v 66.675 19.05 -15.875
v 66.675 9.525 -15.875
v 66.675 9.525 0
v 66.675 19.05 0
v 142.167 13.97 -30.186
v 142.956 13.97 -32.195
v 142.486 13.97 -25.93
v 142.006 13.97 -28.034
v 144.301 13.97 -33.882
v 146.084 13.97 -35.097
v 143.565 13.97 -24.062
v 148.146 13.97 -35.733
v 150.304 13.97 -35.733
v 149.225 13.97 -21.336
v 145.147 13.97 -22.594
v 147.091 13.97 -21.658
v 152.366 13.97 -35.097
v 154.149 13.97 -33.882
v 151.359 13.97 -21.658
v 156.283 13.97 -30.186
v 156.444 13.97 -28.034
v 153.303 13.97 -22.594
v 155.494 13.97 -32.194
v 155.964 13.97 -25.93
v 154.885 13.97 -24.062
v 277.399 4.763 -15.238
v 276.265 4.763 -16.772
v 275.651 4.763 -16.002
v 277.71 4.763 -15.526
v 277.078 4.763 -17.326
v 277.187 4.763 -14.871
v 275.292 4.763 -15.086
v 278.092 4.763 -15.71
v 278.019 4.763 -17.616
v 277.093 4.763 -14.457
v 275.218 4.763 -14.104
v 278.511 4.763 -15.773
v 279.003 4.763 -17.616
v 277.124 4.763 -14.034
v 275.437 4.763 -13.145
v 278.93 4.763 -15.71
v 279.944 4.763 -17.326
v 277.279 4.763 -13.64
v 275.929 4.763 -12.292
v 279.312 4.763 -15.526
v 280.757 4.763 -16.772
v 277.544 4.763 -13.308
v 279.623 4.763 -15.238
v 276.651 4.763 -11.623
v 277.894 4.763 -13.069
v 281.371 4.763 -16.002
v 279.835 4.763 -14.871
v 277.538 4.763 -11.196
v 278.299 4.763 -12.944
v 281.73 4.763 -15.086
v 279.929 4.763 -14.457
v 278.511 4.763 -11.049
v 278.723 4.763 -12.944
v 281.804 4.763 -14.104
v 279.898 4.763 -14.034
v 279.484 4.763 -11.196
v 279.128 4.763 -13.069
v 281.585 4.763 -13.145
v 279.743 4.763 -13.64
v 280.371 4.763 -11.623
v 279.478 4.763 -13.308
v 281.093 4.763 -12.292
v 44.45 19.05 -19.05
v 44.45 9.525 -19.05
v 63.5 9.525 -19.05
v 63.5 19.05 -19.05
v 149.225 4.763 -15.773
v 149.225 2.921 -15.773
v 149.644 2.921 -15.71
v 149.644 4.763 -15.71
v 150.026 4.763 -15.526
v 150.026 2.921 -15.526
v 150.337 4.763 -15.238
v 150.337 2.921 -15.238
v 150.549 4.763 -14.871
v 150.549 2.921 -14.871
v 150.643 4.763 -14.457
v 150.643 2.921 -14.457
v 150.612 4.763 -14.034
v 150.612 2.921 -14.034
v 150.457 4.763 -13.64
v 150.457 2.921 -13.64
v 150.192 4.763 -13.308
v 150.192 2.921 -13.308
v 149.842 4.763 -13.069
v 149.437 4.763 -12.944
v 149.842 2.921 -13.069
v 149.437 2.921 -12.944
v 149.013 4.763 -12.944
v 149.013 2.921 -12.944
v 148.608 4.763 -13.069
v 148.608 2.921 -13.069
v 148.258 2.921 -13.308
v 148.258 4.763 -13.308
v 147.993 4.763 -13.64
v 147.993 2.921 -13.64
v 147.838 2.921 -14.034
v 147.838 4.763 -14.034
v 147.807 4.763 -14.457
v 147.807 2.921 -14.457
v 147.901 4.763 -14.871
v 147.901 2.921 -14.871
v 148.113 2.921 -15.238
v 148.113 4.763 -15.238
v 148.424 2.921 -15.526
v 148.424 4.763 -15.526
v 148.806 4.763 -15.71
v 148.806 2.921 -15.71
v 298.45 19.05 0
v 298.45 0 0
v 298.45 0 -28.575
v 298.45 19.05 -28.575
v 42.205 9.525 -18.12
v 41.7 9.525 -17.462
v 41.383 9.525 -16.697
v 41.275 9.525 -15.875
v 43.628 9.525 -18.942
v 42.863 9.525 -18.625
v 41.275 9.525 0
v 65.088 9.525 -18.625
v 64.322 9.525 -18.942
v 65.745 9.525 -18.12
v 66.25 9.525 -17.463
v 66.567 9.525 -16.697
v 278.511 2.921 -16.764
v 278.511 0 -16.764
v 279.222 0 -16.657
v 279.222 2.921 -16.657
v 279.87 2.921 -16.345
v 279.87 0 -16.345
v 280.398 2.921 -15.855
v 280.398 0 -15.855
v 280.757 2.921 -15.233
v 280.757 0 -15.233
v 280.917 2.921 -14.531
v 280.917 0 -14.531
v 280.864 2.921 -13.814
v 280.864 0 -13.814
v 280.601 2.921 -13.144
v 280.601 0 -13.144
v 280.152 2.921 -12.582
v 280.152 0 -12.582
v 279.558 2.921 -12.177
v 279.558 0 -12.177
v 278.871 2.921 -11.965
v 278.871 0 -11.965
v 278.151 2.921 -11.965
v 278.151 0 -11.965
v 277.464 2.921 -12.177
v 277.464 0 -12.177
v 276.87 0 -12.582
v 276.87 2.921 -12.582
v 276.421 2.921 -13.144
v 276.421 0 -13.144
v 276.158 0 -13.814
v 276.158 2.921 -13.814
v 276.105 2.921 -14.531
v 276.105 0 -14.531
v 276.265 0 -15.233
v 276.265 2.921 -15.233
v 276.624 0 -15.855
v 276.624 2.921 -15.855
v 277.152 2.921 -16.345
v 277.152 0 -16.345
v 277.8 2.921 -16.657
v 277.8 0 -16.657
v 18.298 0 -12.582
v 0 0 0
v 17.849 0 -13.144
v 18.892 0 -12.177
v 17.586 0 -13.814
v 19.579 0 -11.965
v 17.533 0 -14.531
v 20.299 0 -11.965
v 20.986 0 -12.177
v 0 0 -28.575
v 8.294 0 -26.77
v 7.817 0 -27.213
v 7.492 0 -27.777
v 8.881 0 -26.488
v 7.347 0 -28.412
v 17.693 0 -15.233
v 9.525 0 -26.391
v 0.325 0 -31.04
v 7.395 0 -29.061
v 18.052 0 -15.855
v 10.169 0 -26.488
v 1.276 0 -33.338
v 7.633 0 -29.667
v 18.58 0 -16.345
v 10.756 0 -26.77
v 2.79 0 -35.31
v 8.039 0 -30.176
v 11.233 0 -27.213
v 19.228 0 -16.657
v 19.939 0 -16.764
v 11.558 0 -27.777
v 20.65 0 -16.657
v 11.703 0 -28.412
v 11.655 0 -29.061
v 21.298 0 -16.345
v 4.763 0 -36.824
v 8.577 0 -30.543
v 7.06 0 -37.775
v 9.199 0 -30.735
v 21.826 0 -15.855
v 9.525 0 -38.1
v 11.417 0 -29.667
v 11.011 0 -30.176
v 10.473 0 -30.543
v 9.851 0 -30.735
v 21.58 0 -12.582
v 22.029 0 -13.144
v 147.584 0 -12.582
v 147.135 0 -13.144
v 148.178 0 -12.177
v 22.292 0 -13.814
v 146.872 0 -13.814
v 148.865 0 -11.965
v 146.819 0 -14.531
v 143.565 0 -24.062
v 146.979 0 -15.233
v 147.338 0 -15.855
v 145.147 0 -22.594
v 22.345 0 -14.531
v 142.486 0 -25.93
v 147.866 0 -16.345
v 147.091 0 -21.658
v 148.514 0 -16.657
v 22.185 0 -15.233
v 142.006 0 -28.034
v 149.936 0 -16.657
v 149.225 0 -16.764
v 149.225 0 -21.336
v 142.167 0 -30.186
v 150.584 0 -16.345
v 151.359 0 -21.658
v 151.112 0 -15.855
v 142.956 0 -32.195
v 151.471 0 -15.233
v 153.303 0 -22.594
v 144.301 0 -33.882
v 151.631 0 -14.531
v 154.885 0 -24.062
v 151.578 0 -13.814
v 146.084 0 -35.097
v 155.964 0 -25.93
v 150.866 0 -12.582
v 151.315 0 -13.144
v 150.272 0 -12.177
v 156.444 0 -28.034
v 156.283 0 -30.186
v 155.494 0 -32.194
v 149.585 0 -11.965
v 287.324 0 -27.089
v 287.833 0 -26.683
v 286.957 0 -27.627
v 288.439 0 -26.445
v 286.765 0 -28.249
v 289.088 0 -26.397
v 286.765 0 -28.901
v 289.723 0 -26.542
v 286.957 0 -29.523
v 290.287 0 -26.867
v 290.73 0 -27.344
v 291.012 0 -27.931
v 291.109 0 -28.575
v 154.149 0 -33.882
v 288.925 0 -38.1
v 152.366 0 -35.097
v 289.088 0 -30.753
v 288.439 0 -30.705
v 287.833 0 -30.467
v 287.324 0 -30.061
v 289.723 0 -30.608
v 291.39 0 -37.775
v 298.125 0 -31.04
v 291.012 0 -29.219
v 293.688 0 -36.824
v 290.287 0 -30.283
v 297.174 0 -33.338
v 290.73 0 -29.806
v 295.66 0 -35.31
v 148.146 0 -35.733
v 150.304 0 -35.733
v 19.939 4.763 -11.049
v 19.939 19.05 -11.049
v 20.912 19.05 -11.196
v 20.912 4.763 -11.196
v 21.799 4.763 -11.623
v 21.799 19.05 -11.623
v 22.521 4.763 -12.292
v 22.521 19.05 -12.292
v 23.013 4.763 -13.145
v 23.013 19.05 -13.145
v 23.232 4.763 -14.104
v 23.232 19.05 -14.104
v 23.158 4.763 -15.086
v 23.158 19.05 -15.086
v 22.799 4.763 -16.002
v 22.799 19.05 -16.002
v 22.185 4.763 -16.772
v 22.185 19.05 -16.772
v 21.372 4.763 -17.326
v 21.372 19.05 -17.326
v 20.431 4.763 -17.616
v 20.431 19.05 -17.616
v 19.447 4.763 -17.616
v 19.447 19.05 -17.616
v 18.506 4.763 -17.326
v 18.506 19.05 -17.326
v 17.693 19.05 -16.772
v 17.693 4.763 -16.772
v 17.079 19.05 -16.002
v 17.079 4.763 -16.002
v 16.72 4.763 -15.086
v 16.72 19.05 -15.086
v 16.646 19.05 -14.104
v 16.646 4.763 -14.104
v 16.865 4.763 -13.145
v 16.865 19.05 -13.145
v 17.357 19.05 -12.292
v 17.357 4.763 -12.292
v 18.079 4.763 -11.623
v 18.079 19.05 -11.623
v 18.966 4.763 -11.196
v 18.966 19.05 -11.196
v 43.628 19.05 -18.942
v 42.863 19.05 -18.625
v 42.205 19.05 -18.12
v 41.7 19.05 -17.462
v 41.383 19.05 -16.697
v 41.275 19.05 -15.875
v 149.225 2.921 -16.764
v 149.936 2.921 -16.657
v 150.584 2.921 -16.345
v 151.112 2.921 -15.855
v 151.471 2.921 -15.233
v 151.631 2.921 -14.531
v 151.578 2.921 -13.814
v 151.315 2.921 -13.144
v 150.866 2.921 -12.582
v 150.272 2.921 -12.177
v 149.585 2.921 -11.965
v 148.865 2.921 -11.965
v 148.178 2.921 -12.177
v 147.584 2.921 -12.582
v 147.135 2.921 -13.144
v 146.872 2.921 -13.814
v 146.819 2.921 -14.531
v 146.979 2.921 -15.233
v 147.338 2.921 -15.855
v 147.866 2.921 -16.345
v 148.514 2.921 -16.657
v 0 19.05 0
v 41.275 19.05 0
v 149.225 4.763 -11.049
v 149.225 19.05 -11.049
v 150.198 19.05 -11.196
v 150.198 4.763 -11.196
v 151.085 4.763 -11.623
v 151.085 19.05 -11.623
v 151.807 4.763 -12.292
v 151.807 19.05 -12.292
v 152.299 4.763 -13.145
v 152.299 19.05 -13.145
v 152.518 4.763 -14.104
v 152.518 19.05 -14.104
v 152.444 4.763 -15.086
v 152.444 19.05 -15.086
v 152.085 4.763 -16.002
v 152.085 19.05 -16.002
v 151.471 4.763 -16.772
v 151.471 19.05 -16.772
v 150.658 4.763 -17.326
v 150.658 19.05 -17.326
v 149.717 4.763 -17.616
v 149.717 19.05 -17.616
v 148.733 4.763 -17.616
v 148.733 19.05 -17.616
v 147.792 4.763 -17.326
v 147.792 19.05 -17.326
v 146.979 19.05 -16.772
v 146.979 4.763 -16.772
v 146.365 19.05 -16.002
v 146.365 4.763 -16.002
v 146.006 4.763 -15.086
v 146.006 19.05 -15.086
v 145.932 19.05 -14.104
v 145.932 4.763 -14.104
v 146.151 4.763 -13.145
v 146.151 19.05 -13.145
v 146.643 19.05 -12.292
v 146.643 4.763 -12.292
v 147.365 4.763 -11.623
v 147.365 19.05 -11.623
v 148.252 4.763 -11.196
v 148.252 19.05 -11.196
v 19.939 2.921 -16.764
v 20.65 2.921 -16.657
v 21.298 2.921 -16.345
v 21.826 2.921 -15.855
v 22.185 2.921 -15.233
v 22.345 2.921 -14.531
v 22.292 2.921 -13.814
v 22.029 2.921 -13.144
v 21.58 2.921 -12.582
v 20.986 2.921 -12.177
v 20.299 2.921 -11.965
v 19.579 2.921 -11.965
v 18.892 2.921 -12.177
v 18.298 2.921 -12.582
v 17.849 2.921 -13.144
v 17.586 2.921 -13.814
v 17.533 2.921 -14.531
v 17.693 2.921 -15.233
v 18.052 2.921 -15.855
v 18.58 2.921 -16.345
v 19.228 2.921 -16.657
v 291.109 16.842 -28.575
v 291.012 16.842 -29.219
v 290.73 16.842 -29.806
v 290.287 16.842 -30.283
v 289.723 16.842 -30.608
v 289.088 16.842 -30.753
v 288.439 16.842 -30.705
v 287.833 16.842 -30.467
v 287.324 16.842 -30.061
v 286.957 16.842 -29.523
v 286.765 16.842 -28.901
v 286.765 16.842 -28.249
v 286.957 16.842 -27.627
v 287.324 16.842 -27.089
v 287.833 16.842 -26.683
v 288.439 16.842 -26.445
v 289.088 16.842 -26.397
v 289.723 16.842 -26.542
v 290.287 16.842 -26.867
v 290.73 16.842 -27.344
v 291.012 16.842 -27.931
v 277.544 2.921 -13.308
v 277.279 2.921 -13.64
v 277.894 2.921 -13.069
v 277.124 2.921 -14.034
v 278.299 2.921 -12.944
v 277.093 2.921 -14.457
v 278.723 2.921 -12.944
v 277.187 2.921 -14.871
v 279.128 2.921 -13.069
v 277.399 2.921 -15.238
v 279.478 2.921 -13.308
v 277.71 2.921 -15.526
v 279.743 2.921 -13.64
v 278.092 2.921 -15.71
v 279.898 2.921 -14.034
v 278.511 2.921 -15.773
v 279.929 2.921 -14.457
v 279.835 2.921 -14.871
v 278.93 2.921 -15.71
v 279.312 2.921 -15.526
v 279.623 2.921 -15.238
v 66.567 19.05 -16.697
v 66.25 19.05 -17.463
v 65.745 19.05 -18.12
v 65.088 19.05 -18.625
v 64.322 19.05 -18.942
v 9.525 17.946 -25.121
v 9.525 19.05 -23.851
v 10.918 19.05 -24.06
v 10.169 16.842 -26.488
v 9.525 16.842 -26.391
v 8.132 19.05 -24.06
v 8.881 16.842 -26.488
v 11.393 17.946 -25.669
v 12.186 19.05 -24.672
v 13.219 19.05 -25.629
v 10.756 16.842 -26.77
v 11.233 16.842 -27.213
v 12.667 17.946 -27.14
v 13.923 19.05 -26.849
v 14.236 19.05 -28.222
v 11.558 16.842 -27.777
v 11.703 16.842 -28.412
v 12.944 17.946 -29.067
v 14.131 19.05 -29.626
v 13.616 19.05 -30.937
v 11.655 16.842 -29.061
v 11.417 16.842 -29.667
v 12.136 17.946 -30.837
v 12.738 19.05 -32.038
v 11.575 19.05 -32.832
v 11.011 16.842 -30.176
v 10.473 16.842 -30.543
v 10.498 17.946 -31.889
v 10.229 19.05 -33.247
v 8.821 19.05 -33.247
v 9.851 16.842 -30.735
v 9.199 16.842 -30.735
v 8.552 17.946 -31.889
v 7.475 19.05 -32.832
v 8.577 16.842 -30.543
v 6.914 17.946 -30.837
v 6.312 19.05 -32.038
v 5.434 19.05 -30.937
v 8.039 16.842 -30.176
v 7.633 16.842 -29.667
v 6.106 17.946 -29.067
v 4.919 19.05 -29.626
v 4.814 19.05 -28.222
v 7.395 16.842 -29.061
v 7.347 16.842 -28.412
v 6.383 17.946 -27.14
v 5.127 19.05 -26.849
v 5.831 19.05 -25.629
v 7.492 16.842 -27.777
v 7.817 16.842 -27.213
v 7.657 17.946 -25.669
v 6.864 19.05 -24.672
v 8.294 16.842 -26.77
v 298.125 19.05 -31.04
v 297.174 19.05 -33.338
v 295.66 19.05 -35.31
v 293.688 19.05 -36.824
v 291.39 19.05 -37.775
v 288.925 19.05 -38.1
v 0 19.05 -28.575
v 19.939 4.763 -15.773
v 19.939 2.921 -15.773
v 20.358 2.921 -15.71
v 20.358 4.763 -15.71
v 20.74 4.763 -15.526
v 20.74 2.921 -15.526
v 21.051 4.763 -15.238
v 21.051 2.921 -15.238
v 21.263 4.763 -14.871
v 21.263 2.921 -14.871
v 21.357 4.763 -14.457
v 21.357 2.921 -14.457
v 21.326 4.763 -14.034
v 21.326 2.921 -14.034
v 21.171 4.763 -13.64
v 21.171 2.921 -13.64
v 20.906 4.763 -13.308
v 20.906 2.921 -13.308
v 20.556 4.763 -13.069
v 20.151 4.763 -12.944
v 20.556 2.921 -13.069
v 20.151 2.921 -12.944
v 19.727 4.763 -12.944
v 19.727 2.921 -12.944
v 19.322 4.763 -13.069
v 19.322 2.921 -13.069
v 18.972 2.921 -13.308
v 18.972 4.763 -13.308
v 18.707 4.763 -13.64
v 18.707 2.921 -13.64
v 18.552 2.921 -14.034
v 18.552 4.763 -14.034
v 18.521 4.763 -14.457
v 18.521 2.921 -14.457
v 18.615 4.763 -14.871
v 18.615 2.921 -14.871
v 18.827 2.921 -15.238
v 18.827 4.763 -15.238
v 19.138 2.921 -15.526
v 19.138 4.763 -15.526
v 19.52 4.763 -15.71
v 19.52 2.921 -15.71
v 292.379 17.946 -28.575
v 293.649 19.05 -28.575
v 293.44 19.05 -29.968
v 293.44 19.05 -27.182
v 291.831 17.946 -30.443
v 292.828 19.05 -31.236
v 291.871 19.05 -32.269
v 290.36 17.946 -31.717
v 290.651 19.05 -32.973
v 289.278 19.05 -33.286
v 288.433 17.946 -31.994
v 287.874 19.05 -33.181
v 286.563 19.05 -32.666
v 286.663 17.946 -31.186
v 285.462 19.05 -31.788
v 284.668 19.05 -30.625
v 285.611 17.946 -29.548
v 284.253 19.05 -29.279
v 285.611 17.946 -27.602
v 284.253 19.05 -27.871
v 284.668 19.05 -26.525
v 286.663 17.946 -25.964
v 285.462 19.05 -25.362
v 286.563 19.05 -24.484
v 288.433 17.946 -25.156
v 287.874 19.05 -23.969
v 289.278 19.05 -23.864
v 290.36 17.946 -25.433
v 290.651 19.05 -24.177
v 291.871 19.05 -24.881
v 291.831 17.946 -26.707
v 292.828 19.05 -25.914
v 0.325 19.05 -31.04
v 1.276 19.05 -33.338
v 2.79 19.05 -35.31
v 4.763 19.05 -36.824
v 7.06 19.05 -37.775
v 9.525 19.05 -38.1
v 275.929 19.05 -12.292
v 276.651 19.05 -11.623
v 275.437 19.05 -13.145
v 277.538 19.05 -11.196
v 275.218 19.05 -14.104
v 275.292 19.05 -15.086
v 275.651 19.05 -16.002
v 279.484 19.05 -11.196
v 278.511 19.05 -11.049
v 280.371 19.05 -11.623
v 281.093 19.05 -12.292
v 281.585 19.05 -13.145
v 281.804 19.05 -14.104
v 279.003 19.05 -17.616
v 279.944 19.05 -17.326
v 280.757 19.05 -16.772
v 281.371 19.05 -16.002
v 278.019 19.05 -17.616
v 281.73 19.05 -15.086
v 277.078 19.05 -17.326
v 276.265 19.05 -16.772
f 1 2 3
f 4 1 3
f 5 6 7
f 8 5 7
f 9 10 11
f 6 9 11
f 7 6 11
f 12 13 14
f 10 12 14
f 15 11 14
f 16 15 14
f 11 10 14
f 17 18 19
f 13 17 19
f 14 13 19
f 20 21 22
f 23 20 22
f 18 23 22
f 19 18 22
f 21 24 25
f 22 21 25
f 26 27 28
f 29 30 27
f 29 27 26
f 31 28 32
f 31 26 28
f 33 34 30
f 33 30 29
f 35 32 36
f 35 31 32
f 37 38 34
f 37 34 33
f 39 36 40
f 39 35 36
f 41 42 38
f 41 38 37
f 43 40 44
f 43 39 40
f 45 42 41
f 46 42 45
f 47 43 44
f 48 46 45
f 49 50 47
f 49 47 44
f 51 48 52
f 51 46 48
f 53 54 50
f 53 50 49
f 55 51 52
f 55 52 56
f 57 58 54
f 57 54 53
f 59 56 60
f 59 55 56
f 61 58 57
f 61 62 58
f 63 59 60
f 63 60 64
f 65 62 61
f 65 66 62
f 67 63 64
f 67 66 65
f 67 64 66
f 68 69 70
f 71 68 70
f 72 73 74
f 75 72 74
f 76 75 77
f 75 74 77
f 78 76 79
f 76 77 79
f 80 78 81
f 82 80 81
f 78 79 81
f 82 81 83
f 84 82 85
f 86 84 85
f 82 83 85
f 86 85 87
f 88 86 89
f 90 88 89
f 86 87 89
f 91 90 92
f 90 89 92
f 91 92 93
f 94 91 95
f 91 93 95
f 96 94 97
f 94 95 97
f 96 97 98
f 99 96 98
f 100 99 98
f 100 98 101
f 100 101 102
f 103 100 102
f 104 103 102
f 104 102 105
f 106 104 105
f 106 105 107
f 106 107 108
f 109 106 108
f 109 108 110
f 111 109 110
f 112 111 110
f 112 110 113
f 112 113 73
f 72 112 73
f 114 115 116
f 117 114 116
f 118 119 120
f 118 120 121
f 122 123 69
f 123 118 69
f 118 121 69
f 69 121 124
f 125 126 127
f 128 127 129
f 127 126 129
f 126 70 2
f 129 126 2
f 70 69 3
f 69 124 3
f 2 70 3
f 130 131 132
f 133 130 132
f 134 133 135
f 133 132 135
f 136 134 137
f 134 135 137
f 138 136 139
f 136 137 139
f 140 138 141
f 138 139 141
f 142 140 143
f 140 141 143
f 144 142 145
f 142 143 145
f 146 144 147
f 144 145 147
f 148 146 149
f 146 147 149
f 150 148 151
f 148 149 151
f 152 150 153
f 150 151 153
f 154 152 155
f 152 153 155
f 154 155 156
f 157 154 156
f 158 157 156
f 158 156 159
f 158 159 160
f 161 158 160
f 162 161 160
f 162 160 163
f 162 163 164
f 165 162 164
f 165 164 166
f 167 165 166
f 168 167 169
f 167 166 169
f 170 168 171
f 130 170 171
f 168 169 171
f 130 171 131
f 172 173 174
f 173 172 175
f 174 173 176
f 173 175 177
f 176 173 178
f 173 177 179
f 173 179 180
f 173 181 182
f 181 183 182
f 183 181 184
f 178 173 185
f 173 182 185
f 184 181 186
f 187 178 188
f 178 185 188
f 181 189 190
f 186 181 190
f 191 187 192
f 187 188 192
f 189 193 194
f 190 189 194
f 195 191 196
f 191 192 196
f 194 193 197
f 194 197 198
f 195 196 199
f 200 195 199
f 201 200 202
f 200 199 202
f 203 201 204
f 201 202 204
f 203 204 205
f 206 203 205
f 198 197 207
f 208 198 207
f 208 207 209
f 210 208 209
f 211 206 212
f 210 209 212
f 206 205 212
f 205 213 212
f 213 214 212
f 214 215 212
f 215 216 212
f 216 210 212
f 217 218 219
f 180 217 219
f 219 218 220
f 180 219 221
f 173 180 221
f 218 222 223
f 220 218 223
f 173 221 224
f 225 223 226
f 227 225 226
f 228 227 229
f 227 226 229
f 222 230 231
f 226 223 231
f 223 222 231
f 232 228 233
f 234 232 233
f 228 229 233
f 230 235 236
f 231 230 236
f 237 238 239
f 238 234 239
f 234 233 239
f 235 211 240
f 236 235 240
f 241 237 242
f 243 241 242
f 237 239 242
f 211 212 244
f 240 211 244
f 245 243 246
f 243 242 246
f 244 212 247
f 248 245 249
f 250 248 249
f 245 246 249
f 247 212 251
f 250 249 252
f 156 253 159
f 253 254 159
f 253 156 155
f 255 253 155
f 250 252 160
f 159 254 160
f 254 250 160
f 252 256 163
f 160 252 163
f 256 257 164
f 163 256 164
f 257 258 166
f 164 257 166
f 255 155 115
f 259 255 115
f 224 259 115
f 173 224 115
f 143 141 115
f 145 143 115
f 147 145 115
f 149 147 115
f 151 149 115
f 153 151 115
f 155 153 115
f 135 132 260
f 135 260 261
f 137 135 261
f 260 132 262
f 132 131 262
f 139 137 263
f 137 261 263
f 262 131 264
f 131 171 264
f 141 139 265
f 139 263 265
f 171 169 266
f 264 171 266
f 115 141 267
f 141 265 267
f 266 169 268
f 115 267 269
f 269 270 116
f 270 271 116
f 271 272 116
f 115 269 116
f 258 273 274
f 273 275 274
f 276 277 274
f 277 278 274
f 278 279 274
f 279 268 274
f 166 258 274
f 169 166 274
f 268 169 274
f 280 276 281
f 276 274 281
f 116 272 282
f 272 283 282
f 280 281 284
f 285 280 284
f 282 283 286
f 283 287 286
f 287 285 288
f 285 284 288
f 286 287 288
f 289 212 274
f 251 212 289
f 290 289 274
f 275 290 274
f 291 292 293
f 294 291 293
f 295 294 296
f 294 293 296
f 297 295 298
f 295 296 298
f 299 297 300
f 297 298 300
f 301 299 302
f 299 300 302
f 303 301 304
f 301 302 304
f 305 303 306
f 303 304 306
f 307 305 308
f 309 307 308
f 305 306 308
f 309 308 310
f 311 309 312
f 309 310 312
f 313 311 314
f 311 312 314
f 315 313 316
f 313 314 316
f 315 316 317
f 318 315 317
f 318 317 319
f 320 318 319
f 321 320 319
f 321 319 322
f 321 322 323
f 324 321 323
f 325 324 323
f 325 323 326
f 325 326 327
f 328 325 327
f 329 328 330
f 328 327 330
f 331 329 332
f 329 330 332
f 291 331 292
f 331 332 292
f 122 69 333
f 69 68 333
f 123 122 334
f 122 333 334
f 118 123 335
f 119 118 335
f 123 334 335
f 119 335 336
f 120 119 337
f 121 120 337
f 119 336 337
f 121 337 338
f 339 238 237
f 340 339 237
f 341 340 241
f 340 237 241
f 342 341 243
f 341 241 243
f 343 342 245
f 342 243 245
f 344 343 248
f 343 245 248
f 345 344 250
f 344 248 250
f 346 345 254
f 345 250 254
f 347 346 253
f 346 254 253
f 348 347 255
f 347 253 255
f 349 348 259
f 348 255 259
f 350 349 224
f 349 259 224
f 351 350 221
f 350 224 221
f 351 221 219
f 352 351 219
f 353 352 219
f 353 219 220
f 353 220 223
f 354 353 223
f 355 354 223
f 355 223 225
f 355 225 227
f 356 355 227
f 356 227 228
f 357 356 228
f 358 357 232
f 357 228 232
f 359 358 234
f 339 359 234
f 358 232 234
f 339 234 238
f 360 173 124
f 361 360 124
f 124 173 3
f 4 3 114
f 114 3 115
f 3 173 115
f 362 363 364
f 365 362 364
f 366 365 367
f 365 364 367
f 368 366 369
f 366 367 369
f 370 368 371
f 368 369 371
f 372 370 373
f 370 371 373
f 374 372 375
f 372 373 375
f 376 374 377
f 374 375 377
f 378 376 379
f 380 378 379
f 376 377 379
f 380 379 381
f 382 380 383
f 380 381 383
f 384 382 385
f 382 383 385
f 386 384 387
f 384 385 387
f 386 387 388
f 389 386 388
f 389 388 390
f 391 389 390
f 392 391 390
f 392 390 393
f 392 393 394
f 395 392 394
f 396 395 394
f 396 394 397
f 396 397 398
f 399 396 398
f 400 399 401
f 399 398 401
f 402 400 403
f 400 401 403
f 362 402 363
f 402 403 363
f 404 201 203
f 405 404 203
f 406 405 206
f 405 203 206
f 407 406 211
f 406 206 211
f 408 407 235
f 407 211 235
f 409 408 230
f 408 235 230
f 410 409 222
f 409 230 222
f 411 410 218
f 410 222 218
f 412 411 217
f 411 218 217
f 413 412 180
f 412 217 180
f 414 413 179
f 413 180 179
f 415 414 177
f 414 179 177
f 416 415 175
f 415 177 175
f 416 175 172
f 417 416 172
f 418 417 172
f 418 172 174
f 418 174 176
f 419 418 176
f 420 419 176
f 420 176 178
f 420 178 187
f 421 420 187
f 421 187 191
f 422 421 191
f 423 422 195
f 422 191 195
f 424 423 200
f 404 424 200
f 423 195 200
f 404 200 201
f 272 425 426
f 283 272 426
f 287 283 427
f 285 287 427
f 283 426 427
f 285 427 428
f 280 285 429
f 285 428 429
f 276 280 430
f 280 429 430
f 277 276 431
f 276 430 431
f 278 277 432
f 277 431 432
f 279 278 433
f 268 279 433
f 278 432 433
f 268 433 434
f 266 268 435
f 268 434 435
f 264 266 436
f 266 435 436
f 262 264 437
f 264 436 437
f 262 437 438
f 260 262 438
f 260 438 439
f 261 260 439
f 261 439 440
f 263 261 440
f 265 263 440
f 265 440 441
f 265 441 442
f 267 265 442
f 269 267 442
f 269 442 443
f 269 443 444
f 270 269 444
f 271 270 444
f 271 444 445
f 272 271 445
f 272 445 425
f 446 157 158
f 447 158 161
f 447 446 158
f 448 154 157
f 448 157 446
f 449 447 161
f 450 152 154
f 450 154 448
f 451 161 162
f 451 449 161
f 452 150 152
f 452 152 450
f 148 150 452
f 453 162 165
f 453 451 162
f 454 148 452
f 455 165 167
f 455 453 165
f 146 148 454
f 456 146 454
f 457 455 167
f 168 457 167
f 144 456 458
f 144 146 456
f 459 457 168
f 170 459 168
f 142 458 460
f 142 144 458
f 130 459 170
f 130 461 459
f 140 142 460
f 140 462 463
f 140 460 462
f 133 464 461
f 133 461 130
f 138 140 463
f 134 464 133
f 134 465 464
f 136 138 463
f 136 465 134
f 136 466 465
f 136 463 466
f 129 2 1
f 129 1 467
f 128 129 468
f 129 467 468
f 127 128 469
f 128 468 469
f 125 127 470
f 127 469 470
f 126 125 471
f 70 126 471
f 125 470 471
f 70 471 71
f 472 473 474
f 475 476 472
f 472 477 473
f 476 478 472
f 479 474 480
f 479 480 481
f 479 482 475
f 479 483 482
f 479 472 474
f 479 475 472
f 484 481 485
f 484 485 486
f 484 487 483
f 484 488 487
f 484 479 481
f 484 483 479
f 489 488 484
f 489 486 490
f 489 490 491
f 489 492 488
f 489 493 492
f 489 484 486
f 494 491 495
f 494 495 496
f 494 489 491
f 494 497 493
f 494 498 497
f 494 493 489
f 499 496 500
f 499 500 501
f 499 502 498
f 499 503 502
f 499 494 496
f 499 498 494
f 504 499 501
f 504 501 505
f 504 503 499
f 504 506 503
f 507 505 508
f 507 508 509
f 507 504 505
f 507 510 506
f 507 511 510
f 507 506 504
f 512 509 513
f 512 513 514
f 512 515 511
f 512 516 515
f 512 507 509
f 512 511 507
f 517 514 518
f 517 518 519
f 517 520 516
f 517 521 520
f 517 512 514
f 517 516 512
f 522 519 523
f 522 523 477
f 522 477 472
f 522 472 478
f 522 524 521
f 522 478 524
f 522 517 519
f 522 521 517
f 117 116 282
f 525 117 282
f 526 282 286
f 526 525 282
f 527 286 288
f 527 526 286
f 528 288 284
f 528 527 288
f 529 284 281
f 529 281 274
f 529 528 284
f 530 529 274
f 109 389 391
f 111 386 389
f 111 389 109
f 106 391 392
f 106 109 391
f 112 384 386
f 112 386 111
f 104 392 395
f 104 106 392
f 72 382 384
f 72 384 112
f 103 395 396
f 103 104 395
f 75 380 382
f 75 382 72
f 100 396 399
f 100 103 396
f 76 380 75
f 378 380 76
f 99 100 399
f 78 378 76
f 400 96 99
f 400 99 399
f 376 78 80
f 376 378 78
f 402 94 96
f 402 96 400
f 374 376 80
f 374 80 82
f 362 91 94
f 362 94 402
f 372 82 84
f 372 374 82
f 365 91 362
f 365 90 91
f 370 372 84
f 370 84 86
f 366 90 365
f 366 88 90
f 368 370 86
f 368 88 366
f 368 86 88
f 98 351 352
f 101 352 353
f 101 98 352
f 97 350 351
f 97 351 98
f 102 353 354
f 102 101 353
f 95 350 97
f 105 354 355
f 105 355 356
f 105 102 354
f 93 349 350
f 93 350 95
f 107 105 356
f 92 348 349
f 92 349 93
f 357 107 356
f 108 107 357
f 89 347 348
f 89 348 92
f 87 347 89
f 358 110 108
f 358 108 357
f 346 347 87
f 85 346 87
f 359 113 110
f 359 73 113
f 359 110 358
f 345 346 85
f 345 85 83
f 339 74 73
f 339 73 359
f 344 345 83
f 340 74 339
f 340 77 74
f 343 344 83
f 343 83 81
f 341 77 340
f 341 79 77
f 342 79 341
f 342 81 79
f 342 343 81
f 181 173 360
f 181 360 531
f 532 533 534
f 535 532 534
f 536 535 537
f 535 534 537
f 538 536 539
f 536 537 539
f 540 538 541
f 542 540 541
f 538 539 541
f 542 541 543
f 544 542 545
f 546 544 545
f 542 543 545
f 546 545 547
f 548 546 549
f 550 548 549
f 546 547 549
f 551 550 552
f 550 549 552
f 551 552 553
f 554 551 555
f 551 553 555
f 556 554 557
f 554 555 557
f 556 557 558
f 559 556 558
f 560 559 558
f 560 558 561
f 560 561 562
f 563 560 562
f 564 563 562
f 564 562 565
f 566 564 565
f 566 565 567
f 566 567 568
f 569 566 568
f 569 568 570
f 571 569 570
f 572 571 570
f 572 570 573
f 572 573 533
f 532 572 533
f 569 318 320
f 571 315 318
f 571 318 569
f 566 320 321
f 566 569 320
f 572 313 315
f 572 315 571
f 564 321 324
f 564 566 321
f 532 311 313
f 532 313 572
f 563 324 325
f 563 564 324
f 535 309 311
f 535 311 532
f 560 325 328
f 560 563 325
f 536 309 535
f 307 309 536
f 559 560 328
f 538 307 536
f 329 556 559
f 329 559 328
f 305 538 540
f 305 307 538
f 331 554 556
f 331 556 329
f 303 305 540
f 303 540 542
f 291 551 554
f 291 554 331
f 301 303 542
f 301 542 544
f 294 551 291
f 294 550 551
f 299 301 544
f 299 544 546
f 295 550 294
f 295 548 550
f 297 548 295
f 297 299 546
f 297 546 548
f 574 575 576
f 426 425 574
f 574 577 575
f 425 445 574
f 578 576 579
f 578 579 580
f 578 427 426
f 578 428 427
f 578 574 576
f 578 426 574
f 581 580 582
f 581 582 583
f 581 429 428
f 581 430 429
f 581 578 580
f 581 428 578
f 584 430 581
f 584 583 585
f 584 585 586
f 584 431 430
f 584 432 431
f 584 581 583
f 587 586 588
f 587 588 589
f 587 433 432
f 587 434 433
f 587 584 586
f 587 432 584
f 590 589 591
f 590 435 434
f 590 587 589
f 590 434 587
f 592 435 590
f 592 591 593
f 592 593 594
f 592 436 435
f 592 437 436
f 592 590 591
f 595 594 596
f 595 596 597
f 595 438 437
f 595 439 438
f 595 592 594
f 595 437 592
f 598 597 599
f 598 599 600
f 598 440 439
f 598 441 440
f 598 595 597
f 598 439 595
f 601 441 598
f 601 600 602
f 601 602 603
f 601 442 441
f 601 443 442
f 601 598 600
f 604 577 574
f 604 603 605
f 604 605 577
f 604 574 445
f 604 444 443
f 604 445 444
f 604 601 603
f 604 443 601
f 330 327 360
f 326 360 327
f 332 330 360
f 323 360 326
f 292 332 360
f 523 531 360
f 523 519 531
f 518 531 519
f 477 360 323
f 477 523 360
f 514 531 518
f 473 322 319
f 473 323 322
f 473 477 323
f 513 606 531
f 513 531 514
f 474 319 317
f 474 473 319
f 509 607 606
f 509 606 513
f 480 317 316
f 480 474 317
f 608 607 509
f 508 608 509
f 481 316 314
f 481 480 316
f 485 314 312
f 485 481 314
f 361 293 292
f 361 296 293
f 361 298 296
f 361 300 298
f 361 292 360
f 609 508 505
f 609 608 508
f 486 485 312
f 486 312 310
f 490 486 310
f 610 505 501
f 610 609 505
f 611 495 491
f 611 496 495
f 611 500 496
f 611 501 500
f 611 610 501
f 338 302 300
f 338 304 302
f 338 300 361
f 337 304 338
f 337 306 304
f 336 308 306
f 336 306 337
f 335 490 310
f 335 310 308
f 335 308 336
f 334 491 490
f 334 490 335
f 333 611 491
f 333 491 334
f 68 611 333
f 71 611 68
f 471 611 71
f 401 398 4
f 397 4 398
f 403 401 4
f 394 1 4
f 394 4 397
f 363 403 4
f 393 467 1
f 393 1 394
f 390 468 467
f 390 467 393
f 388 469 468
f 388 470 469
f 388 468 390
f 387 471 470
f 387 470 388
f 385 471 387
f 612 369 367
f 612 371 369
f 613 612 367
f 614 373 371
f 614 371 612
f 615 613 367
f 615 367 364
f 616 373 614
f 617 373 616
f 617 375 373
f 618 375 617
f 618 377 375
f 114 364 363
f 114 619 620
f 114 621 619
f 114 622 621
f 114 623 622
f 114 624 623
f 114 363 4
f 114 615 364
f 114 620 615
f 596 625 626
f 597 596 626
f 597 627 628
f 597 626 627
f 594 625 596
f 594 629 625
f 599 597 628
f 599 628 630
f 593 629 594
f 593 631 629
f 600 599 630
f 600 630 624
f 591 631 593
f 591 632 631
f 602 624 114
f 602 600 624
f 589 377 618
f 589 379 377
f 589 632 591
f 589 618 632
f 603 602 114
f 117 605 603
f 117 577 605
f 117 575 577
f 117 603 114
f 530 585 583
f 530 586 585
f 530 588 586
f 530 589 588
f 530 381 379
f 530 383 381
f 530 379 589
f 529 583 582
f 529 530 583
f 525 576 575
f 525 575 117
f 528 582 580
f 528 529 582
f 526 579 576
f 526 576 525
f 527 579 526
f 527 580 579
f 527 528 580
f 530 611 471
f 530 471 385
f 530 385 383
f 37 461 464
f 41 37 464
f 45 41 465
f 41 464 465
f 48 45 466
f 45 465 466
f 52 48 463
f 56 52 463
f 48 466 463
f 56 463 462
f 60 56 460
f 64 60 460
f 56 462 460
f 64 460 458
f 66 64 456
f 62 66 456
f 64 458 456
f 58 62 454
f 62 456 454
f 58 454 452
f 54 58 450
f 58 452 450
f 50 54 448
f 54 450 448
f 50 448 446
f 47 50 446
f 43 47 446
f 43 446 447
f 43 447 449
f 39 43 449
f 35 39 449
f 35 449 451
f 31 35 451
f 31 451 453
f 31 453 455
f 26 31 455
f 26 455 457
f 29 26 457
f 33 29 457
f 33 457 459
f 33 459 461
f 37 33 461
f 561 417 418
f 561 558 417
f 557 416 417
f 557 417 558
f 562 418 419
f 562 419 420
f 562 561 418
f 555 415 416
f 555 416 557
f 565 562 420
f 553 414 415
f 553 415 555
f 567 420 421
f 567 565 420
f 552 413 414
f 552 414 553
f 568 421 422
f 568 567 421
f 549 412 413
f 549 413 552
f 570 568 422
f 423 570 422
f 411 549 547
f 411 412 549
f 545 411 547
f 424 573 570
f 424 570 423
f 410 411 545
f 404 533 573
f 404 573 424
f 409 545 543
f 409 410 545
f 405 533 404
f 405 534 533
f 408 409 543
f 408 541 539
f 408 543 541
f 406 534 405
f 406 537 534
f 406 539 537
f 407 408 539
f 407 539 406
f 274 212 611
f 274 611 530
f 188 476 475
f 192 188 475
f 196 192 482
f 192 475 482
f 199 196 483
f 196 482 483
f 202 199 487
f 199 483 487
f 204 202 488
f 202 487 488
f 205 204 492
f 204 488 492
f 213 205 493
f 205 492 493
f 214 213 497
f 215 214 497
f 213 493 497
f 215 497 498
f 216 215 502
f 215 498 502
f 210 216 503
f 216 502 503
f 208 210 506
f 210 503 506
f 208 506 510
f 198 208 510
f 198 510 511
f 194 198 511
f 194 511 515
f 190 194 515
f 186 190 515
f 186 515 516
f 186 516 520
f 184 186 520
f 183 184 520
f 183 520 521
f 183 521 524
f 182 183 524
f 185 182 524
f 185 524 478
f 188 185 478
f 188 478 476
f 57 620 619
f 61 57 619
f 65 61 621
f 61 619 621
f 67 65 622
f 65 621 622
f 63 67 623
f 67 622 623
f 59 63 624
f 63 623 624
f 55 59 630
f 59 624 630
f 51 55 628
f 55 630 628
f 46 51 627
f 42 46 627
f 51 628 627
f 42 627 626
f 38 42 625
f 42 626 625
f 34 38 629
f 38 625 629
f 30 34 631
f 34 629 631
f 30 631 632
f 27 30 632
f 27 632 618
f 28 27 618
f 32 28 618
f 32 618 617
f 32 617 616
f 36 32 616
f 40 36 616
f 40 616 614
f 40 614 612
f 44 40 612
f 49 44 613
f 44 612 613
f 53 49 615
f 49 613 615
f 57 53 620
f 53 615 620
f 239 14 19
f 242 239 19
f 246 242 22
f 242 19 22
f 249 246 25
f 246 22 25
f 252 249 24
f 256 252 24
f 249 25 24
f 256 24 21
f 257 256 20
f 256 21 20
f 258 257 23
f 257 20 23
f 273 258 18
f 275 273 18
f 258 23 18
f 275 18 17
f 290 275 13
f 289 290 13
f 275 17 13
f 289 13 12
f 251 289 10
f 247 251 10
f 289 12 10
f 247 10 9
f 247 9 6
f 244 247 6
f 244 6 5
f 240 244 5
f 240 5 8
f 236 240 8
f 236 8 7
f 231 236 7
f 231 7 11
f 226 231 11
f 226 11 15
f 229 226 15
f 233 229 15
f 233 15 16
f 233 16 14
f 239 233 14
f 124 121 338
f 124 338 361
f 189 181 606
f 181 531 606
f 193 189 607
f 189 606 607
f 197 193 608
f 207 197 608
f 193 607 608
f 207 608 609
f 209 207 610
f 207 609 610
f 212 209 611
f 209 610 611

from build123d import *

# Parameters (mm, degrees)
SKETCH1_W           = 298.45
SKETCH1_H           = 38.1
BOSS_EXTRUDE1_DEPTH = 19.05
FILLET1_R           = 9.525
SKETCH2_R           = 3.302
CUT_EXTRUDE1_DEPTH  = 14.2875
SKETCH4_R           = 1.4224
CUT_EXTRUDE2_DEPTH  = 302.47456775
SKETCH5_R           = 2.413
CUT_EXTRUDE3_DEPTH  = 2.921
SKETCH6_R           = 2.1844
CUT_EXTRUDE4_DEPTH  = 302.47456775
CHAMFER1_SIZE       = 2.54
CHAMFER1_SIZE2      = 2.207988314
CUT_EXTRUDE5_START  = -5.08
SKETCH7_R           = 7.239
CUT_EXTRUDE5_DEPTH  = 297.39456775
CUT_EXTRUDE6_START  = -9.525
SKETCH8_W           = 25.4
SKETCH8_H           = 19.05
CUT_EXTRUDE6_DEPTH  = 9.525
FILLET2_R           = 3.175


with BuildPart() as part:
    # Sketch1 → Boss-Extrude1 (new body)
    with BuildSketch(Plane(origin=(0, 0, 0), x_dir=(1, 0, 0), z_dir=(0, 1, 0))):
        with Locations((149.225, 19.05)):
            Rectangle(SKETCH1_W, SKETCH1_H)
    extrude(amount=BOSS_EXTRUDE1_DEPTH)

    # Fillet1
    fillet1_edges = [part.edges().sort_by_distance(p)[0] for p in [
        (0, 9.525, -38.1),
        (298.45, 9.525, -38.1),
    ]]
    fillet(fillet1_edges, radius=FILLET1_R)

    # Sketch2 → Cut-Extrude1 (cut)
    with BuildSketch(Plane(origin=(0, 19.05, 0), x_dir=(1, 0, 0), z_dir=(0, 1, 0))):
        with Locations(Location((19.939, 14.351, 0), (0, 0, 270))):
            Circle(SKETCH2_R)
        with Locations(Location((149.225, 14.351, 0), (0, 0, 270))):
            Circle(SKETCH2_R)
        with Locations(Location((278.511, 14.351, 0), (0, 0, 270))):
            Circle(SKETCH2_R)
    extrude(amount=-CUT_EXTRUDE1_DEPTH, mode=Mode.SUBTRACT)

    # Sketch4 → Cut-Extrude2 (cut, through all)
    with BuildSketch(Plane.XZ):
        with Locations(Location((19.939, -14.351, 0), (0, 0, 270))):
            Circle(SKETCH4_R)
        with Locations(Location((149.225, -14.351, 0), (0, 0, 270))):
            Circle(SKETCH4_R)
        with Locations(Location((278.511, -14.351, 0), (0, 0, 270))):
            Circle(SKETCH4_R)
    extrude(amount=-CUT_EXTRUDE2_DEPTH, mode=Mode.SUBTRACT)

    # Sketch5 → Cut-Extrude3 (cut)
    with BuildSketch(Plane.XZ):
        with Locations(Location((19.939, -14.351, 0), (0, 0, 270))):
            Circle(SKETCH5_R)
        with Locations(Location((149.225, -14.351, 0), (0, 0, 270))):
            Circle(SKETCH5_R)
        with Locations(Location((278.511, -14.351, 0), (0, 0, 270))):
            Circle(SKETCH5_R)
    extrude(amount=-CUT_EXTRUDE3_DEPTH, mode=Mode.SUBTRACT)

    # Sketch6 → Cut-Extrude4 (cut, through all)
    with BuildSketch(Plane(origin=(0, 19.05, 0), x_dir=(1, 0, 0), z_dir=(0, 1, 0))):
        with BuildLine():
            ThreePointArc((286.7406, 28.575), (288.925, 26.3906), (291.1094, 28.575))
            Line((291.1094, 28.575), (286.7406, 28.575))
        make_face()
        with BuildLine():
            Line((286.7406, 28.575), (291.1094, 28.575))
            ThreePointArc((291.1094, 28.575), (288.925, 30.7594), (286.7406, 28.575))
        make_face()
        with Locations(Location((9.525, 28.575, 0), (0, 0, 270))):
            Circle(SKETCH6_R)
    extrude(amount=-CUT_EXTRUDE4_DEPTH, mode=Mode.SUBTRACT)

    # Chamfer1
    chamfer1_edges = [part.edges().sort_by_distance(p)[0] for p in [
        (291.1094, 19.05, -28.575),
        (9.525, 19.05, -30.7594),
    ]]
    chamfer1_side = [part.faces().sort_by_distance(p)[0] for p in [
        (149.225, 19.05, -19.008778326),
    ]]
    chamfer(chamfer1_edges, length=CHAMFER1_SIZE, length2=CHAMFER1_SIZE2, reference=chamfer1_side[0])

    # Sketch7 → Cut-Extrude5 (cut, through all)
    with BuildSketch(Plane(origin=(0, 19.05, 0), x_dir=(1, 0, 0), z_dir=(0, 1, 0)).offset(CUT_EXTRUDE5_START)):
        with Locations(Location((149.225, 28.575, 0), (0, 0, 270))):
            Circle(SKETCH7_R)
    extrude(amount=-CUT_EXTRUDE5_DEPTH, mode=Mode.SUBTRACT)

    # Sketch8 → Cut-Extrude6 (cut)
    with BuildSketch(Plane.XZ.offset(CUT_EXTRUDE6_START)):
        with Locations((53.975, -9.525)):
            Rectangle(SKETCH8_W, SKETCH8_H)
    extrude(amount=-CUT_EXTRUDE6_DEPTH, mode=Mode.SUBTRACT)

    # Fillet2
    fillet2_edges = [part.edges().sort_by_distance(p)[0] for p in [
        (41.275, 14.2875, -19.05),
        (66.675, 14.2875, -19.05),
    ]]
    fillet(fillet2_edges, radius=FILLET2_R)


solid = part.part
